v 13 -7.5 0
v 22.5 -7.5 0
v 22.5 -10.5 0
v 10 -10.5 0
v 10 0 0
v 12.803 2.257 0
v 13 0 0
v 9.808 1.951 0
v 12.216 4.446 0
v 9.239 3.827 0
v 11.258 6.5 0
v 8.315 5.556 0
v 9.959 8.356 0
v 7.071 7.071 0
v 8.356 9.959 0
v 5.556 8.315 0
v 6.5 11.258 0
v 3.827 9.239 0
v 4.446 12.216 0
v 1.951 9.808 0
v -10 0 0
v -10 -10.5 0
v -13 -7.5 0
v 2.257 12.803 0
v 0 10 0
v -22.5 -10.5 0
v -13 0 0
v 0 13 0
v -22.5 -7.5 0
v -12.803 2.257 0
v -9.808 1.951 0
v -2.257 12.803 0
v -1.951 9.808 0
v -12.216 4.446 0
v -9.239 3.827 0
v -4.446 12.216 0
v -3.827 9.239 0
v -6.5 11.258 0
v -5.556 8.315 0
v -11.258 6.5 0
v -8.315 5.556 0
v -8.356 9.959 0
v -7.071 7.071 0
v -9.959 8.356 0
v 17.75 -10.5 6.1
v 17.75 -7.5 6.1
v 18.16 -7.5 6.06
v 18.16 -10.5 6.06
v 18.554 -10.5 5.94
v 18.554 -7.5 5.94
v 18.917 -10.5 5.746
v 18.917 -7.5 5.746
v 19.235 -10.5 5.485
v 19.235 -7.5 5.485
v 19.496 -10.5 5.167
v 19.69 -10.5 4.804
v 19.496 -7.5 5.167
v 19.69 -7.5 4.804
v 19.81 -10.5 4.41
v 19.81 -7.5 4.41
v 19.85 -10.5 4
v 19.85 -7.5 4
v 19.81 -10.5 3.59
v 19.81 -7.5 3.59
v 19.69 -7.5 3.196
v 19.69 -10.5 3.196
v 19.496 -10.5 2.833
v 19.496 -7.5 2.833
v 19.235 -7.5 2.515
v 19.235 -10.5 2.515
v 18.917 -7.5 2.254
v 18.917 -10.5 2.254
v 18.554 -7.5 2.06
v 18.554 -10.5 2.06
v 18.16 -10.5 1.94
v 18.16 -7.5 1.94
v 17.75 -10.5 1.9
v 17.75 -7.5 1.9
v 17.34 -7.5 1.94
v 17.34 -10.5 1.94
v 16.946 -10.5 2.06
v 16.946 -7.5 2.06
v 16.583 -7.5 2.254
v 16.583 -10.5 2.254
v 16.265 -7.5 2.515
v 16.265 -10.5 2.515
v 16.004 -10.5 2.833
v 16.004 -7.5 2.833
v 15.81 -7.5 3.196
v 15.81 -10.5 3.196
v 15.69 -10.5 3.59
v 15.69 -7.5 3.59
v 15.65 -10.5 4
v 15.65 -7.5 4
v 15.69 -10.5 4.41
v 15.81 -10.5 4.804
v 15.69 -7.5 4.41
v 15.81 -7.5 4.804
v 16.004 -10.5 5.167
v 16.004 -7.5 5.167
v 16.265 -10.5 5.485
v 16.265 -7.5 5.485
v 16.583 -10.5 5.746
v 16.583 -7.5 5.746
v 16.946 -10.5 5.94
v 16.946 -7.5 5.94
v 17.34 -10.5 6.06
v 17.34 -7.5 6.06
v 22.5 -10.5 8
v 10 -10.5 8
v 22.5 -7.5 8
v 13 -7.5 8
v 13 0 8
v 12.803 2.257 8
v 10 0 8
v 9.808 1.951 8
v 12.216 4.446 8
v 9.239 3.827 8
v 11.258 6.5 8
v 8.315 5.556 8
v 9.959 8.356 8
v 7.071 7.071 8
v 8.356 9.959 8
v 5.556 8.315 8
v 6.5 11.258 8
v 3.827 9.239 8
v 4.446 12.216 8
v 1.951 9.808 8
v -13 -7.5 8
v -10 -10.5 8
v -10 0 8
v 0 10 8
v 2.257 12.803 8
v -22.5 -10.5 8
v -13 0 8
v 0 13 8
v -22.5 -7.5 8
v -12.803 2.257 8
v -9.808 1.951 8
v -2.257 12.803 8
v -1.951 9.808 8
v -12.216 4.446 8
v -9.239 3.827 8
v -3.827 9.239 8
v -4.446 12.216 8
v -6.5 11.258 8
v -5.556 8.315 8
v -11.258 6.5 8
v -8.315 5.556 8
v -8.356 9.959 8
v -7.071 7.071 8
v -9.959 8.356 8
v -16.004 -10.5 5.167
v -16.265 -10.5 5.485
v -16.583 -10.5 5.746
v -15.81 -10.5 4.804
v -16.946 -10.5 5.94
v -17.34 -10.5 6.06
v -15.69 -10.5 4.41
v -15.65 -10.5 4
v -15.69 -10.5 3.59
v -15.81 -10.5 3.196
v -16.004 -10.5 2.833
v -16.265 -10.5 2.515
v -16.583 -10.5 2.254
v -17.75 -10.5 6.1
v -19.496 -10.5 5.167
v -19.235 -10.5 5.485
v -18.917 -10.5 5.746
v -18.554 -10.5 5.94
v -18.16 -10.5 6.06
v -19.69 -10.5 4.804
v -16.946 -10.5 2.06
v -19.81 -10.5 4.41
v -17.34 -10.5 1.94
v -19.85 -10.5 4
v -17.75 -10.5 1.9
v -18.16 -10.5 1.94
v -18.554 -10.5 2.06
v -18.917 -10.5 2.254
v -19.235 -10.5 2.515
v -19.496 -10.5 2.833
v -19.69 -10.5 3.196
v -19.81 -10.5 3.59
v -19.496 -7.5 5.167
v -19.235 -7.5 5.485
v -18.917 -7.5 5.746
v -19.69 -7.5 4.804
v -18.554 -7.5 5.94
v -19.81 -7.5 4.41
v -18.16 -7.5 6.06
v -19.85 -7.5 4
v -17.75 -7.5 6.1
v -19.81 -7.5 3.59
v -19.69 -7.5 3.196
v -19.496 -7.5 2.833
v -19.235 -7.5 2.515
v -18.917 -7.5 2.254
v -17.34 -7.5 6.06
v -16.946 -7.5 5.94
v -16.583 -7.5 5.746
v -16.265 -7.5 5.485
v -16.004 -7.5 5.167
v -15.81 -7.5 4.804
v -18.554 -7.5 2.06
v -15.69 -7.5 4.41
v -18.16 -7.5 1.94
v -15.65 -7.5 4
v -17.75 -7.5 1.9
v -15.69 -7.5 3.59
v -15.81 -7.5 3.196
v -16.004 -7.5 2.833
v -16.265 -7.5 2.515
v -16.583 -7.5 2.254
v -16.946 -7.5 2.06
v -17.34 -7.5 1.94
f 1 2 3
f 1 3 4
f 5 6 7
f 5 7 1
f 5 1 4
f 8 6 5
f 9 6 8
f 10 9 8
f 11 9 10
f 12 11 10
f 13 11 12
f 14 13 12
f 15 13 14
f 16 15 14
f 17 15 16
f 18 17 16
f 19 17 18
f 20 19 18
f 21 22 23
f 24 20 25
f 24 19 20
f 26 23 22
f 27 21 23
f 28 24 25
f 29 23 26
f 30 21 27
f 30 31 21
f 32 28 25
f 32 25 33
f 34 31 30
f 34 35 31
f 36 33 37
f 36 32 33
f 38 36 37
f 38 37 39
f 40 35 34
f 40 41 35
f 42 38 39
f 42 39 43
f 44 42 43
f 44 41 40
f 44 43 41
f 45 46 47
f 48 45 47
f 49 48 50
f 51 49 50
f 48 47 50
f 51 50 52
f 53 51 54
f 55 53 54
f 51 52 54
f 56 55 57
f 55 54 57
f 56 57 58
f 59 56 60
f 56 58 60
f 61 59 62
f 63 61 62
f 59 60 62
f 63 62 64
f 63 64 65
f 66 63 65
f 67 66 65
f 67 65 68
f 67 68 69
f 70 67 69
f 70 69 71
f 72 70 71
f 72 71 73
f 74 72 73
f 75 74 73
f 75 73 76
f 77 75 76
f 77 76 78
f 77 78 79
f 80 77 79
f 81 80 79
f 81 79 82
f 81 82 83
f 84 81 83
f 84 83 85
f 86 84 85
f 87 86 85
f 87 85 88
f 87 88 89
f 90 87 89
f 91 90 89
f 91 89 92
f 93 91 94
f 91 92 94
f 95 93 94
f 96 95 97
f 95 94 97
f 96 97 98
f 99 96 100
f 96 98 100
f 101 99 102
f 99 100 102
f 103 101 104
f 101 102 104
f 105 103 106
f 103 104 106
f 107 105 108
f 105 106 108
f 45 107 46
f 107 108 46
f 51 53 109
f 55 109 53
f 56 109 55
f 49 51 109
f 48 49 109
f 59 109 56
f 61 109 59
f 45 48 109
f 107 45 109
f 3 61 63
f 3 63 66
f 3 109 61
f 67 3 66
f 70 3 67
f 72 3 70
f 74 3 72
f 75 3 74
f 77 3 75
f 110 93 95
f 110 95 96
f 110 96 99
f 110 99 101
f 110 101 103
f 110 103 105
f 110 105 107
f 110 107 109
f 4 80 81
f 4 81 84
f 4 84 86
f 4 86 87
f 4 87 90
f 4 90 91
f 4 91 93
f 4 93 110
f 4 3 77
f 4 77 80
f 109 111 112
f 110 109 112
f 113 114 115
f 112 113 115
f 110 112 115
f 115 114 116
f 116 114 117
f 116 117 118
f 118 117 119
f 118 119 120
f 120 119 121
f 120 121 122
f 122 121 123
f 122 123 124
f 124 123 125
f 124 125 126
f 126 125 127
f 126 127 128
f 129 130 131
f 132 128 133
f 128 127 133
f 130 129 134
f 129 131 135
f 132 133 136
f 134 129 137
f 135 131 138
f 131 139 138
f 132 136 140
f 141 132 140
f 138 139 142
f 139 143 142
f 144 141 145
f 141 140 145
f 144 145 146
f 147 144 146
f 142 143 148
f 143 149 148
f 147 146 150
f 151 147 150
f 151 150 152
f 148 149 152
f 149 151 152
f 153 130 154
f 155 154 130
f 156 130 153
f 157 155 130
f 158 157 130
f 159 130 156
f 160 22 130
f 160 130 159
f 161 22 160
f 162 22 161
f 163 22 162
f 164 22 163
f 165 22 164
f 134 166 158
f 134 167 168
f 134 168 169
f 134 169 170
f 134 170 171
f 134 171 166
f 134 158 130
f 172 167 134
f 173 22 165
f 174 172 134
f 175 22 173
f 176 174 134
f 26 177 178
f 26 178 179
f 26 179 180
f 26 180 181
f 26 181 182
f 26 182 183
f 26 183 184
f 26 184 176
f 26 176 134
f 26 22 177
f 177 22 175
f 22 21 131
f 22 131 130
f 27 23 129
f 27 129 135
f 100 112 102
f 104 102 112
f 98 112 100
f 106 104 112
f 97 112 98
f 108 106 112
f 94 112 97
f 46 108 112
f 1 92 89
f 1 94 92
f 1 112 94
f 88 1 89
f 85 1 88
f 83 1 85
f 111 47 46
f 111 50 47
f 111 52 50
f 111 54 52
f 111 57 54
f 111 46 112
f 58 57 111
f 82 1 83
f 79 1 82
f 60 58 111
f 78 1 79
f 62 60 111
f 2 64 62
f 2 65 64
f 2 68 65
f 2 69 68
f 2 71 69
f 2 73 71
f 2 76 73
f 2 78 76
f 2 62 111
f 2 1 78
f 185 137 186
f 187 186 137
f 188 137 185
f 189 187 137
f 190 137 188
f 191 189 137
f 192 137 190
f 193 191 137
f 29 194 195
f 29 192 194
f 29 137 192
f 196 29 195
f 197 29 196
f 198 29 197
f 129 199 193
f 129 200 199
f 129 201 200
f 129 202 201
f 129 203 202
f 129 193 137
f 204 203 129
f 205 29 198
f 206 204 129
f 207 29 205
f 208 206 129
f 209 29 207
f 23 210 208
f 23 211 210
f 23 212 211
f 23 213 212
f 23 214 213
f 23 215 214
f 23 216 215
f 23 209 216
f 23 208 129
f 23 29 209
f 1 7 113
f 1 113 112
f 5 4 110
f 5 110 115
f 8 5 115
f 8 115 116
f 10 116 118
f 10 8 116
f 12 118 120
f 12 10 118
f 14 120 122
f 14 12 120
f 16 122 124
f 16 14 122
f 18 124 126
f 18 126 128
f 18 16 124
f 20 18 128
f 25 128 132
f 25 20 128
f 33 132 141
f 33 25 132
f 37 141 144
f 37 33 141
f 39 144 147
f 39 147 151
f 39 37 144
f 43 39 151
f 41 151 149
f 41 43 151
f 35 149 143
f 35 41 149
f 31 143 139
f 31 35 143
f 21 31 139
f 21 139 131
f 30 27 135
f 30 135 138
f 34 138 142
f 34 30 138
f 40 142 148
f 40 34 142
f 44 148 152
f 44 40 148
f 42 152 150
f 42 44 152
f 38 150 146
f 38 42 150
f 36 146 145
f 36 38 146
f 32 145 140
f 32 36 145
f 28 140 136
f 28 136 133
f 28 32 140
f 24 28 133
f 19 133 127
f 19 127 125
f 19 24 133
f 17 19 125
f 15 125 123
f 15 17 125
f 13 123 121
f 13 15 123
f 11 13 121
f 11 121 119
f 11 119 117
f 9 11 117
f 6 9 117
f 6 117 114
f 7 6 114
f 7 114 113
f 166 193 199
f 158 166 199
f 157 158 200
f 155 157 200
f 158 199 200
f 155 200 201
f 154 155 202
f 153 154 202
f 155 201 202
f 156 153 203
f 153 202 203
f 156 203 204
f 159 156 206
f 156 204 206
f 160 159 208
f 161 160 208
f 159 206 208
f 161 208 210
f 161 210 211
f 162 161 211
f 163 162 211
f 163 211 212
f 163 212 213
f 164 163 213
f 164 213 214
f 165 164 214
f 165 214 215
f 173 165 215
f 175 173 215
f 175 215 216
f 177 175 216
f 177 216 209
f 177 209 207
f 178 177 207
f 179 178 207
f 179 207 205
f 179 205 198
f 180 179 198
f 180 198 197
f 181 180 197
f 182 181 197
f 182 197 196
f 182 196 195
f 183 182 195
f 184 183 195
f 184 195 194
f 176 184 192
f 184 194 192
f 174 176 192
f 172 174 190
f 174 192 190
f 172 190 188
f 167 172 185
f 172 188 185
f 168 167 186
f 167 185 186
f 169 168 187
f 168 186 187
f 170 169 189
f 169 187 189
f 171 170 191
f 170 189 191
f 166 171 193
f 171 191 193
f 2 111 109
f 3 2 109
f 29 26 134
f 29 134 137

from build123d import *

# Parameters (mm, degrees)
CLAMP_DEPTH      = 8
SKETCH2_R        = 2.1
SCREW_HOLE_DEPTH = 32.472209964


with BuildPart() as part:
    # Sketch1 → Clamp (new body)
    with BuildSketch(Plane.XY):
        with BuildLine():
            Line((-22.5, -7.5), (-13, -7.5))
            Line((-13, -7.5), (-13, 0))
            ThreePointArc((-13, 0), (0, 13), (13, 0))
            Line((13, 0), (13, -7.5))
            Line((13, -7.5), (22.5, -7.5))
            Line((22.5, -7.5), (22.5, -10.5))
            Line((22.5, -10.5), (10, -10.5))
            Line((10, -10.5), (10, 0))
            ThreePointArc((10, 0), (0, 10), (-10, 0))
            Line((-10, 0), (-10, -10.5))
            Line((-10, -10.5), (-22.5, -10.5))
            Line((-22.5, -10.5), (-22.5, -7.5))
        make_face()
    extrude(amount=CLAMP_DEPTH)

    # Sketch2 → Screw Hole (cut, through all)
    with BuildSketch(Plane(origin=(0, -7.5, 0), x_dir=(1, 0, 0), z_dir=(0, 1, 0))):
        with Locations((-17.75, -4)):
            Circle(SKETCH2_R)
        with Locations((17.75, -4)):
            Circle(SKETCH2_R)
    extrude(amount=-SCREW_HOLE_DEPTH, mode=Mode.SUBTRACT)


solid = part.part
